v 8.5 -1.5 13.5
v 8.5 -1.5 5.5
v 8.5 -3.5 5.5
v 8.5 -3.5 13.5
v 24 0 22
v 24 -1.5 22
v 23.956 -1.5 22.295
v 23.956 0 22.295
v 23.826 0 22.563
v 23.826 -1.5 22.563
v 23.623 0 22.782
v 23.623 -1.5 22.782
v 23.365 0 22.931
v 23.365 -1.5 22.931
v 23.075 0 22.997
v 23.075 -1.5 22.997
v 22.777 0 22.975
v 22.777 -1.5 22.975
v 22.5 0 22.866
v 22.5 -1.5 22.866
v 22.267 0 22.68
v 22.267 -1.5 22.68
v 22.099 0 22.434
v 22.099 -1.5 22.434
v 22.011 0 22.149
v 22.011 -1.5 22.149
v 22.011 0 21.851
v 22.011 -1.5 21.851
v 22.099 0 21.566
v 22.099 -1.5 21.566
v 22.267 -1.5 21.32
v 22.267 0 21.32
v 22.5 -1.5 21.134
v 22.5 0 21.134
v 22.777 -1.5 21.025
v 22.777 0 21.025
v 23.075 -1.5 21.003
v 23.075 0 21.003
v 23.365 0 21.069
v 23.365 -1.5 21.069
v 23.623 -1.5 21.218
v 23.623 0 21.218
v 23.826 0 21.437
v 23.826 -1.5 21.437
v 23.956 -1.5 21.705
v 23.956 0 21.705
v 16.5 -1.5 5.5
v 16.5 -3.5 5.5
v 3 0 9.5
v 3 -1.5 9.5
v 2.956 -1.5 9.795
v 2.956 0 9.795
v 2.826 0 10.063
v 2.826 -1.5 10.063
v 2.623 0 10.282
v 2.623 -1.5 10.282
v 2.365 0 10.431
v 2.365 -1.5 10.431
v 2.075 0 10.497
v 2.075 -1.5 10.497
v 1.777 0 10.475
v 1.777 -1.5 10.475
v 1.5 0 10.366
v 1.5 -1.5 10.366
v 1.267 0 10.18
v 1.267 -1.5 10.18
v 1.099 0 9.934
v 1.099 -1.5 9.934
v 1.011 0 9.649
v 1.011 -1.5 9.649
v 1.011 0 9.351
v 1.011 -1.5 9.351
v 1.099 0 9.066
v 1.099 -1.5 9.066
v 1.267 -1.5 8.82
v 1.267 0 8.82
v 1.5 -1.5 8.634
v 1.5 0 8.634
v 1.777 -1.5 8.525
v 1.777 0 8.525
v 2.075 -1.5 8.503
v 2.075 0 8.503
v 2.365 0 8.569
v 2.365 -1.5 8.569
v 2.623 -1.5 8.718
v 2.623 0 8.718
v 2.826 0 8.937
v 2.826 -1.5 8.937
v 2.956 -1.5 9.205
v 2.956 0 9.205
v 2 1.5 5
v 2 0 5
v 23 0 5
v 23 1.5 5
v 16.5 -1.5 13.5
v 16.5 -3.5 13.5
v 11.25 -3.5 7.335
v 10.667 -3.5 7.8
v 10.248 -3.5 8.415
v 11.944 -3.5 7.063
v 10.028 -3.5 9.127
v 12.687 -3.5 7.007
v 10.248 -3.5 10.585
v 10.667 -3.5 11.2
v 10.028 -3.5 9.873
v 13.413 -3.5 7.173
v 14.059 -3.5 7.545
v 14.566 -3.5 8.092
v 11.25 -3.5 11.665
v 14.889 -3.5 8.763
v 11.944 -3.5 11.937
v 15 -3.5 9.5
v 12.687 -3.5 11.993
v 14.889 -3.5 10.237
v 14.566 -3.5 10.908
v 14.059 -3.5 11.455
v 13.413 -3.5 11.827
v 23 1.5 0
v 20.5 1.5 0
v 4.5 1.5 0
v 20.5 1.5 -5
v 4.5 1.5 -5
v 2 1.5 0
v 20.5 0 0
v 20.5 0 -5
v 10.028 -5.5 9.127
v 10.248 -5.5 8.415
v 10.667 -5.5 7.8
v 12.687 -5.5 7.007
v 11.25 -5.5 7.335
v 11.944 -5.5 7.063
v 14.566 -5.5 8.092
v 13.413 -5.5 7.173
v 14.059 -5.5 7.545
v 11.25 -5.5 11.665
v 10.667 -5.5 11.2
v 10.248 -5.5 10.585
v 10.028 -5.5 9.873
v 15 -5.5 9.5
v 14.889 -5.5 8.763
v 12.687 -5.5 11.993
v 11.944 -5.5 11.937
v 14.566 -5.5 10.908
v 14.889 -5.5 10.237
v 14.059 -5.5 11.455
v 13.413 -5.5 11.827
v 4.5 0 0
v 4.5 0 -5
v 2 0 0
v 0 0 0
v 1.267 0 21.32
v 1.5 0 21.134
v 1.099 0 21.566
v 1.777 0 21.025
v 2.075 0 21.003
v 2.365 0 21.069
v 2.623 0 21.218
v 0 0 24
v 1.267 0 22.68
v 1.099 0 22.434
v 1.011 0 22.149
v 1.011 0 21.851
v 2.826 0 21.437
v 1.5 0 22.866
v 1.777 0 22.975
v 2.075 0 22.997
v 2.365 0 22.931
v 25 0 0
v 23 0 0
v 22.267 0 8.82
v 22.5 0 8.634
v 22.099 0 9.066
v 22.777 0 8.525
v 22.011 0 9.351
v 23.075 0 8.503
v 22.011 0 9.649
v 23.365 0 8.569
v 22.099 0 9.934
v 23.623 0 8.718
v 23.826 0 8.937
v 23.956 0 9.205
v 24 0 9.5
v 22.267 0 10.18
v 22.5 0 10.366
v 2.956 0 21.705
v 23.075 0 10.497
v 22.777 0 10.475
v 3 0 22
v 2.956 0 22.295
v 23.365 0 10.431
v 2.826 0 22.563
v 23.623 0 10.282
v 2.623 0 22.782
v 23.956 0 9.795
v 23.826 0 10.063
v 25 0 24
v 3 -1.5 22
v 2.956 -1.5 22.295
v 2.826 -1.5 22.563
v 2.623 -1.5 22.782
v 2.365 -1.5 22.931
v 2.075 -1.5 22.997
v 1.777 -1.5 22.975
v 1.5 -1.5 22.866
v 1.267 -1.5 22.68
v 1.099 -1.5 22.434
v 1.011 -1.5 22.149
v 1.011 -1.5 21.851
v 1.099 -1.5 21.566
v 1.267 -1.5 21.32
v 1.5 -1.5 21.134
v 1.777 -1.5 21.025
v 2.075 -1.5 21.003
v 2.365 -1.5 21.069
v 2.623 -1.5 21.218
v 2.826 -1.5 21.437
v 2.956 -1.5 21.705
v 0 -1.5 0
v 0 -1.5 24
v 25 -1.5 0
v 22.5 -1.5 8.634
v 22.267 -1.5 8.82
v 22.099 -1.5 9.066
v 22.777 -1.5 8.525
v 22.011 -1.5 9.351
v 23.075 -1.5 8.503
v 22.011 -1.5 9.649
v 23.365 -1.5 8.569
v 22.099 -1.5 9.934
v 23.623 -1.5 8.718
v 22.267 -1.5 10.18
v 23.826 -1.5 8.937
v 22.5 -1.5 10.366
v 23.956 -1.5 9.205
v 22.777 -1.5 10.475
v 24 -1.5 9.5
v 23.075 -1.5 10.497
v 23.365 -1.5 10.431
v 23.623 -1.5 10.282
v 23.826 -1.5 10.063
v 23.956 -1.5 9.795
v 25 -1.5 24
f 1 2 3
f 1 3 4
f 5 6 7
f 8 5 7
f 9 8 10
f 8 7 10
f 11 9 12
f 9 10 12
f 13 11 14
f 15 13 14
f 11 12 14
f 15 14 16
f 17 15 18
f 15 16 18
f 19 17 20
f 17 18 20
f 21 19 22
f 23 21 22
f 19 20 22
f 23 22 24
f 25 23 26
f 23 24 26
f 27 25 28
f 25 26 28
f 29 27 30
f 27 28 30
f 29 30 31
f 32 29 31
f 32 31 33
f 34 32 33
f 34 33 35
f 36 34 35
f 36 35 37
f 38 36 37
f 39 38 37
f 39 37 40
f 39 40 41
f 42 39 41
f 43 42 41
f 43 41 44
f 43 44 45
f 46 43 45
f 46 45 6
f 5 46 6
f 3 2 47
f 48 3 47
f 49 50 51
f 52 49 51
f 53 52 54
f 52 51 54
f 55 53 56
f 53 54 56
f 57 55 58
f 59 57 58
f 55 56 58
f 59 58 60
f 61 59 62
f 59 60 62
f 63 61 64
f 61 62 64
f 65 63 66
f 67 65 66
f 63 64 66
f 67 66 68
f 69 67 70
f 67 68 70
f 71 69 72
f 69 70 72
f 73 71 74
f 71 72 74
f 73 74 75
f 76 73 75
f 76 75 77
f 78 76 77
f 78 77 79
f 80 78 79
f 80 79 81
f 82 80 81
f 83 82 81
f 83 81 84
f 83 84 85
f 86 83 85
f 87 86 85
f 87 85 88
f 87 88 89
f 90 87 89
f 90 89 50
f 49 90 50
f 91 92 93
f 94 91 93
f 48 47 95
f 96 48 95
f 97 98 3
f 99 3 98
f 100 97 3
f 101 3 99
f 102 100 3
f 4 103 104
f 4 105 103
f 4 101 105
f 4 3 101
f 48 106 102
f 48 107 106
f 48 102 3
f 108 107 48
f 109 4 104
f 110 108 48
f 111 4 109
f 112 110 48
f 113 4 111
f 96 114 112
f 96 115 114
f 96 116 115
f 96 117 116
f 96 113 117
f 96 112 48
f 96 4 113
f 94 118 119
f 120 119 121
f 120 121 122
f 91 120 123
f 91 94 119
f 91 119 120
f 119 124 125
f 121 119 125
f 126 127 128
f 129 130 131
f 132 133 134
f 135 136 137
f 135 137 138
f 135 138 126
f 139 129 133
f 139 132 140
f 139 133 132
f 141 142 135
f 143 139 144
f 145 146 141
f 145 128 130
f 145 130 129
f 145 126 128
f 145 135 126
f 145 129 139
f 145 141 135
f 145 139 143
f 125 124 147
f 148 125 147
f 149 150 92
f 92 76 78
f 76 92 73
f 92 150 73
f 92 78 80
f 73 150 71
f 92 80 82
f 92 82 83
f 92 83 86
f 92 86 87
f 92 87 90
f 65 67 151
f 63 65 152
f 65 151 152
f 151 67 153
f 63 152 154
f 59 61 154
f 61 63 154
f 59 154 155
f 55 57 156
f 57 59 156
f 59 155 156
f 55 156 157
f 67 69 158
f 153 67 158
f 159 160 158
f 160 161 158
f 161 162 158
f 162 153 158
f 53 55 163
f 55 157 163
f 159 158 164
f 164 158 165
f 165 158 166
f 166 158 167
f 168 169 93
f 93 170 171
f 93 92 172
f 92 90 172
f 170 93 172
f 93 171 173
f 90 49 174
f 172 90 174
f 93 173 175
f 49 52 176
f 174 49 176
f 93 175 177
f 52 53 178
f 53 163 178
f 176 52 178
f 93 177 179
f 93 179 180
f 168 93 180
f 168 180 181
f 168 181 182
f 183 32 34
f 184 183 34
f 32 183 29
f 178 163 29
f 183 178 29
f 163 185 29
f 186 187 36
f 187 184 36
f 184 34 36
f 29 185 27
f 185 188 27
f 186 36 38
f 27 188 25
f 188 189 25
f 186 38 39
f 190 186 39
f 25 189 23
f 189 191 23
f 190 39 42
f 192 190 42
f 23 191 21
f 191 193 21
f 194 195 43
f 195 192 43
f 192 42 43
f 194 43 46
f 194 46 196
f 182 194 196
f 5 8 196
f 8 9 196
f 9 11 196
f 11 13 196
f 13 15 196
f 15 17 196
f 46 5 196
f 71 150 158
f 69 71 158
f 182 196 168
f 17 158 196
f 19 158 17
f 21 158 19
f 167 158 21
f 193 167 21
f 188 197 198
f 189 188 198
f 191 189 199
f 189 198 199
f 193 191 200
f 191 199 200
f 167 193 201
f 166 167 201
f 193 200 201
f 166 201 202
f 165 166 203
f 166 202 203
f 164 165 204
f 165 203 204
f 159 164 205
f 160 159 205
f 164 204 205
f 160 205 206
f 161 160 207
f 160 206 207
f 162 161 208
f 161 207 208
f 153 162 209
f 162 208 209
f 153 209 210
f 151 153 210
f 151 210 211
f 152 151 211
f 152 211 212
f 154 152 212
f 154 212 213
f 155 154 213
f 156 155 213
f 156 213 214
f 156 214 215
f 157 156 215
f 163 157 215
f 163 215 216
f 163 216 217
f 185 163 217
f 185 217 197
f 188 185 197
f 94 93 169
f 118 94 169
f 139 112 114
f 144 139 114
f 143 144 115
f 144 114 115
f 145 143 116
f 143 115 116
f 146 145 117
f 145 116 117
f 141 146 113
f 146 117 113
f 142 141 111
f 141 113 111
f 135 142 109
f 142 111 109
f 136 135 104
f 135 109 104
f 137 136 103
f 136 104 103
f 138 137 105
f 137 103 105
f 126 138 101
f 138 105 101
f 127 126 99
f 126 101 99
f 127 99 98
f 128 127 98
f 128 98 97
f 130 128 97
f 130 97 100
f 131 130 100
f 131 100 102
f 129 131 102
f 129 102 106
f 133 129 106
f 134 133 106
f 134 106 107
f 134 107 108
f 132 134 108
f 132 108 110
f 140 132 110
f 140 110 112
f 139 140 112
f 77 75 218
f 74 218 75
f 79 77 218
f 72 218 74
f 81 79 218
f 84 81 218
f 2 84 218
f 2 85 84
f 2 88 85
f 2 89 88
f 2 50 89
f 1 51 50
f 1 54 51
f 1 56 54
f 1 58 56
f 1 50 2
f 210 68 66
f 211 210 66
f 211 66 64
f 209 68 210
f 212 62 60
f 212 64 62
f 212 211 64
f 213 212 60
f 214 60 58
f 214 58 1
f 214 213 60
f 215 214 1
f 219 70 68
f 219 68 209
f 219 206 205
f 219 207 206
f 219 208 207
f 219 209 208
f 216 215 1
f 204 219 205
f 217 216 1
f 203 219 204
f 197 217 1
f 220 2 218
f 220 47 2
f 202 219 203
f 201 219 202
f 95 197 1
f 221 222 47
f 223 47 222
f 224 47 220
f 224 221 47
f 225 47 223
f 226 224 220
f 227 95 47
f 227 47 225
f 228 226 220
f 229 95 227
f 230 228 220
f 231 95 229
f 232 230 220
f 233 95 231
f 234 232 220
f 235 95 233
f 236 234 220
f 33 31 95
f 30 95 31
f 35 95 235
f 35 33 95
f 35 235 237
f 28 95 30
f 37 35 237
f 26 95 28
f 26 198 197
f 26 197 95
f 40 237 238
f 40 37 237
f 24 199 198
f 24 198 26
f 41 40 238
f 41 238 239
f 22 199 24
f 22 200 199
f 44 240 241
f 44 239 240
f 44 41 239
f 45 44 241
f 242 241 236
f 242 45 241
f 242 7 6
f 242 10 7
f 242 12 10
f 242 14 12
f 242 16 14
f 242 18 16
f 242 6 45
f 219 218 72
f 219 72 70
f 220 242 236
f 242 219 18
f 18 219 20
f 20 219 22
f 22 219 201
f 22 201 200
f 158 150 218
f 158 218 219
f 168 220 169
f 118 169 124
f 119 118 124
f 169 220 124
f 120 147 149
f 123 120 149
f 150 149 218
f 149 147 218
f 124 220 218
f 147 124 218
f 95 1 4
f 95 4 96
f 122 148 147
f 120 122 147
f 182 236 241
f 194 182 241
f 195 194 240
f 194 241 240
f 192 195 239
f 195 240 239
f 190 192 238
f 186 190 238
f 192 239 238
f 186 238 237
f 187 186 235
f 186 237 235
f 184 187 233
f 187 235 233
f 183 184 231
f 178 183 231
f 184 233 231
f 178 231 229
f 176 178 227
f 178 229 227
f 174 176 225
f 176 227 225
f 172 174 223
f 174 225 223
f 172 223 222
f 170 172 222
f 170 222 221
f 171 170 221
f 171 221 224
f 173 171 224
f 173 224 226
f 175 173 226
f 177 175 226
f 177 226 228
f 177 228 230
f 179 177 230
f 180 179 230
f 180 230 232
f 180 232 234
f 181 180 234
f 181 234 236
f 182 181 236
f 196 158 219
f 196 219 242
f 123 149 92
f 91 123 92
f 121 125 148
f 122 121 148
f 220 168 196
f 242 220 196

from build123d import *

# Parameters (mm, degrees)
F0_W      = 25
F0_H      = 24
F1_DEPTH  = 1.5
F2_R      = 1
F3_DEPTH  = 1.501
F4_W      = 8
F4_H      = 8
F4_R      = 2.5
F5_DEPTH  = 2
F5_FACE_R = 2.5
F6_DEPTH  = 4
F8_DEPTH  = 1.5


with BuildPart() as f1:
    # F0 (on Front) → F1 (new body)
    with BuildSketch(Plane.XZ):
        with Locations((12.5, 12)):
            Rectangle(F0_W, F0_H)
    extrude(amount=F1_DEPTH)

    # F2 (on face) → F3 (cut, through all)
    with BuildSketch(Plane.XZ.offset(1.5)):
        with Locations((2, 22)):
            Circle(F2_R)
        with Locations((2, 9.5)):
            Circle(F2_R)
        with Locations((23, 22)):
            Circle(F2_R)
        with Locations((23, 9.5)):
            Circle(F2_R)
    extrude(amount=-F3_DEPTH, mode=Mode.SUBTRACT)

    # F4 (on face) → F5 (join)
    with BuildSketch(Plane.XZ.offset(1.5)):
        with Locations((12.5, 9.5)):
            Rectangle(F4_W, F4_H)
        with Locations((12.5, 9.5)):
            Circle(F4_R, mode=Mode.SUBTRACT)
    extrude(amount=F5_DEPTH)

    # F5_face (on face) → F6 (join)
    with BuildSketch(Plane(origin=(12.5, -1.5, 9.5), x_dir=(1, 0, 0), z_dir=(0, -1, 0))):
        Circle(F5_FACE_R)
    extrude(amount=F6_DEPTH)

    # F7 (on face) → F8 (join)
    with BuildSketch(Plane(origin=(0, 0, 0), x_dir=(-1, 0, 0), z_dir=(0, 1, 0))):
        Polygon((-2, 0), (-2, 5), (-23, 5), (-23, 0), (-20.5, 0), (-20.5, -5), (-4.5, -5), (-4.5, 0), align=None)
    extrude(amount=F8_DEPTH)


solid = f1.part
